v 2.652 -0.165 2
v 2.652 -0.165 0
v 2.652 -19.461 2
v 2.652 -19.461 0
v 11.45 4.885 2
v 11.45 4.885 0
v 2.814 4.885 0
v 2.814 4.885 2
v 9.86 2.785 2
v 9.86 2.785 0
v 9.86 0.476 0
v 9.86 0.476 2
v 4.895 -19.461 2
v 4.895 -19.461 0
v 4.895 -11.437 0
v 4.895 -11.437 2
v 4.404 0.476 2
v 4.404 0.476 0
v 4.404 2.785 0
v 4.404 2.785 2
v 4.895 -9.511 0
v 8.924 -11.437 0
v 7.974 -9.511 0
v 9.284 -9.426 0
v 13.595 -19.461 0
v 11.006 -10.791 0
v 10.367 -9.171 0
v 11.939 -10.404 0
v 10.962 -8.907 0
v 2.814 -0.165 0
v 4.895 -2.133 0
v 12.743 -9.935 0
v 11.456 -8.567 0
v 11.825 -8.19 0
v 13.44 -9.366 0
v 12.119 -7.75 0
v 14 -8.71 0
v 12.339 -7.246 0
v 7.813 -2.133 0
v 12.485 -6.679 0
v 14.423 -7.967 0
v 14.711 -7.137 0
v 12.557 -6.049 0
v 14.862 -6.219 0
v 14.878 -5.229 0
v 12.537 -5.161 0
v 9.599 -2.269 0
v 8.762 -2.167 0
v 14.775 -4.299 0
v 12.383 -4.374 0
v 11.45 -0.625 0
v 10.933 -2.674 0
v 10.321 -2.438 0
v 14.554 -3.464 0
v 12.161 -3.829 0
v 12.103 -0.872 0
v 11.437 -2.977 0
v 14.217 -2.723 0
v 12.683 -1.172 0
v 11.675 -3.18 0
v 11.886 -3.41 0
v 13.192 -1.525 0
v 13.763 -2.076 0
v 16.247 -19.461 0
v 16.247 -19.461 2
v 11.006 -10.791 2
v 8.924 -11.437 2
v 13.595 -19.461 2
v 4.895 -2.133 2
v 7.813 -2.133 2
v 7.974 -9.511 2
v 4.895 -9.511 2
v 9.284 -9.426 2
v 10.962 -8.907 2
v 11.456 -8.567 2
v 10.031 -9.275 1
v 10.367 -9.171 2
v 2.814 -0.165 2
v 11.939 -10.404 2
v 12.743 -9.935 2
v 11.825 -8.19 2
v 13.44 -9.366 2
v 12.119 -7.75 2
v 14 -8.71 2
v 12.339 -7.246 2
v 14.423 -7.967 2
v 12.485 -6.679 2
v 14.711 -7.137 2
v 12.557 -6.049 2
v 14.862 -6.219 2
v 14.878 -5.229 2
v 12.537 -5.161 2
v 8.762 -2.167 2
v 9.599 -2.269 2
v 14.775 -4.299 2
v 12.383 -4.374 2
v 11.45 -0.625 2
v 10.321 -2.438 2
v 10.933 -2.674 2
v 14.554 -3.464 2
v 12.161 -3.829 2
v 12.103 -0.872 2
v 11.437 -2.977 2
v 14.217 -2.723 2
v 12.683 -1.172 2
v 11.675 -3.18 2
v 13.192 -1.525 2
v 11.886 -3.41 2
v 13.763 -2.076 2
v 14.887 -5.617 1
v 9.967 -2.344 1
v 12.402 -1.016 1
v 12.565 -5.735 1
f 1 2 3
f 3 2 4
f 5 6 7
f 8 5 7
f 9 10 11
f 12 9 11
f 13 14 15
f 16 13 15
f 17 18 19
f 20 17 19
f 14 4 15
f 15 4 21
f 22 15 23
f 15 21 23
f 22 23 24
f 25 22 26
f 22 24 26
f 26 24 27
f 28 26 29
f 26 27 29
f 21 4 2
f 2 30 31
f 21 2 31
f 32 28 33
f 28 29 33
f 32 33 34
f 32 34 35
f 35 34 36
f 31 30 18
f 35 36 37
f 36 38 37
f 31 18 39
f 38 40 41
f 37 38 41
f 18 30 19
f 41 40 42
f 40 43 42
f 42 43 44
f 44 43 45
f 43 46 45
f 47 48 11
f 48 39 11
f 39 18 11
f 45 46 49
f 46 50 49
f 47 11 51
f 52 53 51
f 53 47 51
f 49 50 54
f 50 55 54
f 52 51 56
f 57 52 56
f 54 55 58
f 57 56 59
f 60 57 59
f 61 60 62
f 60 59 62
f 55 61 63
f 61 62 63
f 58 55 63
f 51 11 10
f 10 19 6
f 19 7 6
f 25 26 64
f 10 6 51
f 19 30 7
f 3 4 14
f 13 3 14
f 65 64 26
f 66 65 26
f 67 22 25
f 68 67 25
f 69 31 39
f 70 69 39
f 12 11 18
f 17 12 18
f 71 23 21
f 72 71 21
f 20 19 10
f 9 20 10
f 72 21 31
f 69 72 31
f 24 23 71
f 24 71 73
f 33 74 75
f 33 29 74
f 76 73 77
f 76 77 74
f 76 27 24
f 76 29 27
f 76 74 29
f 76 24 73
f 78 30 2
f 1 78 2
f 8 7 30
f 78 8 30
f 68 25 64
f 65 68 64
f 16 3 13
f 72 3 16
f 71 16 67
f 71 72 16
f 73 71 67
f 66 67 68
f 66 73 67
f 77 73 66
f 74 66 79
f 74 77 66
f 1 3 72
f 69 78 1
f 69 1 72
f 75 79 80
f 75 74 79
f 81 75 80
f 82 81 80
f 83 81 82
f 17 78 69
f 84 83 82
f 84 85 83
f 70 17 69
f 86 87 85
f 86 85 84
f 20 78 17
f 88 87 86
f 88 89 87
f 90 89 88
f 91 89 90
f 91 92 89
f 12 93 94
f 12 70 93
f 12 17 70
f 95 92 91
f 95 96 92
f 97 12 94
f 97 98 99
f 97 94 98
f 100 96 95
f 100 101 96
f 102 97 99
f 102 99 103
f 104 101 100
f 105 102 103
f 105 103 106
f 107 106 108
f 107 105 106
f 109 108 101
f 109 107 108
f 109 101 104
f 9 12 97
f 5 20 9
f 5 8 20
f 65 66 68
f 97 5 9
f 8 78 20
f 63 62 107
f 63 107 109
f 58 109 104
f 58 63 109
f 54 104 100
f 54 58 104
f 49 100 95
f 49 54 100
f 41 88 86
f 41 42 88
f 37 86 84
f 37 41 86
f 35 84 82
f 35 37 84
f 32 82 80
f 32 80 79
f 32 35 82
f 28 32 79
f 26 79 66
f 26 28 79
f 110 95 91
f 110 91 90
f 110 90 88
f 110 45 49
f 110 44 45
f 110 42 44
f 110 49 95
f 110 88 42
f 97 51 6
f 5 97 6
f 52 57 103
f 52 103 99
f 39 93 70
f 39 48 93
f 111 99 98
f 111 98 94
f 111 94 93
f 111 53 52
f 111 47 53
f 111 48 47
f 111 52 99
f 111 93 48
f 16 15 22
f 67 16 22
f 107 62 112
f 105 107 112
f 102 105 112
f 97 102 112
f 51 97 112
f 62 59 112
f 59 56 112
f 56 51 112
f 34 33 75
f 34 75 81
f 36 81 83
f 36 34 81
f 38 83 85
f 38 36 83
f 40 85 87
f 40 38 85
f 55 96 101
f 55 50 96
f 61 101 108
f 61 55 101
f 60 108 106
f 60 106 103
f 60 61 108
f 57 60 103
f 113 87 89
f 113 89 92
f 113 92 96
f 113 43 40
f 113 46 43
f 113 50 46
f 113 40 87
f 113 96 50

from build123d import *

# Parameters (mm, degrees)
F0_W     = 4.318
F0_H     = 1.4593527386
F1_DEPTH = 2


with BuildPart() as f1:
    # F0 (on Top) → F1 (new body)
    with BuildSketch(Plane.XY):
        with Locations((4.9730502656, -0.8943877724)):
            Rectangle(F0_W, F0_H)
        with BuildLine():
            Line((7.1320502656, -1.6240641417), (2.8140502656, -1.6240641417))
            Line((2.8140502656, -1.6240641417), (2.8140502656, -0.1647114031))
            Line((2.8140502656, -0.1647114031), (2.6522759268, -0.1647114031))
            Line((2.6522759268, -0.1647114031), (2.6522759268, -19.4612857813))
            Line((2.6522759268, -19.4612857813), (4.8948850305, -19.4612857813))
            Line((4.8948850305, -19.4612857813), (4.8948850305, -11.436884092))
            Line((4.8948850305, -11.436884092), (8.9239793524, -11.436884092))
            Line((8.9239793524, -11.436884092), (13.5950258095, -19.4612857813))
            Line((13.5950258095, -19.4612857813), (16.2473017363, -19.4612857813))
            Line((16.2473017363, -19.4612857813), (11.0061004223, -10.7907085875))
            add(Edge.make_bspline(
                [(14.8873768184, -5.6170811825), (14.8873768184, -9.4434537776), (11.0061004223, -10.7907085875)],
                knots=[0, 0, 0, 1, 1, 1], degree=2))
            add(Edge.make_bspline(
                [(13.1916940404, -1.524636321), (14.8873768184, -2.8845612389), (14.8873768184, -5.6170811825)],
                knots=[0, 0, 0, 1, 1, 1], degree=2))
            add(Edge.make_bspline(
                [(11.4500502656, -0.6254353556), (12.4829894147, -0.9562605066), (13.1916940404, -1.524636321)],
                knots=[0.5820535333, 0.5820535333, 0.5820535333, 1, 1, 1], degree=2))
            Line((11.4500502656, -0.6254353556), (11.4500502656, -1.6240641417))
            Line((11.4500502656, -1.6240641417), (7.1320502656, -1.6240641417))
        make_face()
        with BuildLine():
            Line((7.9737212576, -9.5110276865), (4.8948850305, -9.5110276865))
            Line((4.8948850305, -9.5110276865), (4.8948850305, -2.1328015016))
            Line((4.8948850305, -2.1328015016), (7.8132332238, -2.1328015016))
            add(Edge.make_bspline(
                [(11.436884092, -2.9774753637), (10.3092444862, -2.1328015016), (7.8132332238, -2.1328015016)],
                knots=[0, 0, 0, 1, 1, 1], degree=2))
            add(Edge.make_bspline(
                [(12.5645236978, -5.7353355232), (12.5645236978, -3.8221492257), (11.436884092, -2.9774753637)],
                knots=[0, 0, 0, 1, 1, 1], degree=2))
            add(Edge.make_bspline(
                [(11.4558892539, -8.5671046457), (12.5645236978, -7.6231816049), (12.5645236978, -5.7353355232)],
                knots=[0, 0, 0, 1, 1, 1], degree=2))
            add(Edge.make_bspline(
                [(7.9737212576, -9.5110276865), (10.3472548099, -9.5110276865), (11.4558892539, -8.5671046457)],
                knots=[0, 0, 0, 1, 1, 1], degree=2))
        make_face(mode=Mode.SUBTRACT)
        with BuildLine():
            Line((7.1320502656, -0.1647114031), (7.1320502656, -1.6240641417))
            Line((7.1320502656, -1.6240641417), (11.4500502656, -1.6240641417))
            Line((11.4500502656, -1.6240641417), (11.4500502656, -0.6254353556))
            add(Edge.make_bspline(
                [(7.9441576725, -0.1647114031), (10.0115266043, -0.1647114031), (11.4500502656, -0.6254353556)],
                knots=[0, 0, 0, 0.5820535333, 0.5820535333, 0.5820535333], degree=2))
            Line((7.9441576725, -0.1647114031), (7.1320502656, -0.1647114031))
        make_face()
        Polygon((2.8140502656, 4.8854069319), (2.8140502656, -0.1647114031), (7.1320502656, -0.1647114031), (7.1320502656, 0.4763843317), (4.4037376737, 0.4763843317), (4.4037376737, 2.7849584585), (7.1320502656, 2.7849584585), (7.1320502656, 4.8854069319), align=None)
        with BuildLine():
            Line((7.1320502656, 0.4763843317), (7.1320502656, -0.1647114031))
            Line((7.1320502656, -0.1647114031), (7.9441576725, -0.1647114031))
            add(Edge.make_bspline(
                [(7.9441576725, -0.1647114031), (10.0115266043, -0.1647114031), (11.4500502656, -0.6254353556)],
                knots=[0, 0, 0, 0.5820535333, 0.5820535333, 0.5820535333], degree=2))
            Line((11.4500502656, -0.6254353556), (11.4500502656, 4.8854069319))
            Line((11.4500502656, 4.8854069319), (7.1320502656, 4.8854069319))
            Line((7.1320502656, 4.8854069319), (7.1320502656, 2.7849584585))
            Line((7.1320502656, 2.7849584585), (9.8603628576, 2.7849584585))
            Line((9.8603628576, 2.7849584585), (9.8603628576, 0.4763843317))
            Line((9.8603628576, 0.4763843317), (7.1320502656, 0.4763843317))
        make_face()
    extrude(amount=F1_DEPTH)


solid = f1.part
